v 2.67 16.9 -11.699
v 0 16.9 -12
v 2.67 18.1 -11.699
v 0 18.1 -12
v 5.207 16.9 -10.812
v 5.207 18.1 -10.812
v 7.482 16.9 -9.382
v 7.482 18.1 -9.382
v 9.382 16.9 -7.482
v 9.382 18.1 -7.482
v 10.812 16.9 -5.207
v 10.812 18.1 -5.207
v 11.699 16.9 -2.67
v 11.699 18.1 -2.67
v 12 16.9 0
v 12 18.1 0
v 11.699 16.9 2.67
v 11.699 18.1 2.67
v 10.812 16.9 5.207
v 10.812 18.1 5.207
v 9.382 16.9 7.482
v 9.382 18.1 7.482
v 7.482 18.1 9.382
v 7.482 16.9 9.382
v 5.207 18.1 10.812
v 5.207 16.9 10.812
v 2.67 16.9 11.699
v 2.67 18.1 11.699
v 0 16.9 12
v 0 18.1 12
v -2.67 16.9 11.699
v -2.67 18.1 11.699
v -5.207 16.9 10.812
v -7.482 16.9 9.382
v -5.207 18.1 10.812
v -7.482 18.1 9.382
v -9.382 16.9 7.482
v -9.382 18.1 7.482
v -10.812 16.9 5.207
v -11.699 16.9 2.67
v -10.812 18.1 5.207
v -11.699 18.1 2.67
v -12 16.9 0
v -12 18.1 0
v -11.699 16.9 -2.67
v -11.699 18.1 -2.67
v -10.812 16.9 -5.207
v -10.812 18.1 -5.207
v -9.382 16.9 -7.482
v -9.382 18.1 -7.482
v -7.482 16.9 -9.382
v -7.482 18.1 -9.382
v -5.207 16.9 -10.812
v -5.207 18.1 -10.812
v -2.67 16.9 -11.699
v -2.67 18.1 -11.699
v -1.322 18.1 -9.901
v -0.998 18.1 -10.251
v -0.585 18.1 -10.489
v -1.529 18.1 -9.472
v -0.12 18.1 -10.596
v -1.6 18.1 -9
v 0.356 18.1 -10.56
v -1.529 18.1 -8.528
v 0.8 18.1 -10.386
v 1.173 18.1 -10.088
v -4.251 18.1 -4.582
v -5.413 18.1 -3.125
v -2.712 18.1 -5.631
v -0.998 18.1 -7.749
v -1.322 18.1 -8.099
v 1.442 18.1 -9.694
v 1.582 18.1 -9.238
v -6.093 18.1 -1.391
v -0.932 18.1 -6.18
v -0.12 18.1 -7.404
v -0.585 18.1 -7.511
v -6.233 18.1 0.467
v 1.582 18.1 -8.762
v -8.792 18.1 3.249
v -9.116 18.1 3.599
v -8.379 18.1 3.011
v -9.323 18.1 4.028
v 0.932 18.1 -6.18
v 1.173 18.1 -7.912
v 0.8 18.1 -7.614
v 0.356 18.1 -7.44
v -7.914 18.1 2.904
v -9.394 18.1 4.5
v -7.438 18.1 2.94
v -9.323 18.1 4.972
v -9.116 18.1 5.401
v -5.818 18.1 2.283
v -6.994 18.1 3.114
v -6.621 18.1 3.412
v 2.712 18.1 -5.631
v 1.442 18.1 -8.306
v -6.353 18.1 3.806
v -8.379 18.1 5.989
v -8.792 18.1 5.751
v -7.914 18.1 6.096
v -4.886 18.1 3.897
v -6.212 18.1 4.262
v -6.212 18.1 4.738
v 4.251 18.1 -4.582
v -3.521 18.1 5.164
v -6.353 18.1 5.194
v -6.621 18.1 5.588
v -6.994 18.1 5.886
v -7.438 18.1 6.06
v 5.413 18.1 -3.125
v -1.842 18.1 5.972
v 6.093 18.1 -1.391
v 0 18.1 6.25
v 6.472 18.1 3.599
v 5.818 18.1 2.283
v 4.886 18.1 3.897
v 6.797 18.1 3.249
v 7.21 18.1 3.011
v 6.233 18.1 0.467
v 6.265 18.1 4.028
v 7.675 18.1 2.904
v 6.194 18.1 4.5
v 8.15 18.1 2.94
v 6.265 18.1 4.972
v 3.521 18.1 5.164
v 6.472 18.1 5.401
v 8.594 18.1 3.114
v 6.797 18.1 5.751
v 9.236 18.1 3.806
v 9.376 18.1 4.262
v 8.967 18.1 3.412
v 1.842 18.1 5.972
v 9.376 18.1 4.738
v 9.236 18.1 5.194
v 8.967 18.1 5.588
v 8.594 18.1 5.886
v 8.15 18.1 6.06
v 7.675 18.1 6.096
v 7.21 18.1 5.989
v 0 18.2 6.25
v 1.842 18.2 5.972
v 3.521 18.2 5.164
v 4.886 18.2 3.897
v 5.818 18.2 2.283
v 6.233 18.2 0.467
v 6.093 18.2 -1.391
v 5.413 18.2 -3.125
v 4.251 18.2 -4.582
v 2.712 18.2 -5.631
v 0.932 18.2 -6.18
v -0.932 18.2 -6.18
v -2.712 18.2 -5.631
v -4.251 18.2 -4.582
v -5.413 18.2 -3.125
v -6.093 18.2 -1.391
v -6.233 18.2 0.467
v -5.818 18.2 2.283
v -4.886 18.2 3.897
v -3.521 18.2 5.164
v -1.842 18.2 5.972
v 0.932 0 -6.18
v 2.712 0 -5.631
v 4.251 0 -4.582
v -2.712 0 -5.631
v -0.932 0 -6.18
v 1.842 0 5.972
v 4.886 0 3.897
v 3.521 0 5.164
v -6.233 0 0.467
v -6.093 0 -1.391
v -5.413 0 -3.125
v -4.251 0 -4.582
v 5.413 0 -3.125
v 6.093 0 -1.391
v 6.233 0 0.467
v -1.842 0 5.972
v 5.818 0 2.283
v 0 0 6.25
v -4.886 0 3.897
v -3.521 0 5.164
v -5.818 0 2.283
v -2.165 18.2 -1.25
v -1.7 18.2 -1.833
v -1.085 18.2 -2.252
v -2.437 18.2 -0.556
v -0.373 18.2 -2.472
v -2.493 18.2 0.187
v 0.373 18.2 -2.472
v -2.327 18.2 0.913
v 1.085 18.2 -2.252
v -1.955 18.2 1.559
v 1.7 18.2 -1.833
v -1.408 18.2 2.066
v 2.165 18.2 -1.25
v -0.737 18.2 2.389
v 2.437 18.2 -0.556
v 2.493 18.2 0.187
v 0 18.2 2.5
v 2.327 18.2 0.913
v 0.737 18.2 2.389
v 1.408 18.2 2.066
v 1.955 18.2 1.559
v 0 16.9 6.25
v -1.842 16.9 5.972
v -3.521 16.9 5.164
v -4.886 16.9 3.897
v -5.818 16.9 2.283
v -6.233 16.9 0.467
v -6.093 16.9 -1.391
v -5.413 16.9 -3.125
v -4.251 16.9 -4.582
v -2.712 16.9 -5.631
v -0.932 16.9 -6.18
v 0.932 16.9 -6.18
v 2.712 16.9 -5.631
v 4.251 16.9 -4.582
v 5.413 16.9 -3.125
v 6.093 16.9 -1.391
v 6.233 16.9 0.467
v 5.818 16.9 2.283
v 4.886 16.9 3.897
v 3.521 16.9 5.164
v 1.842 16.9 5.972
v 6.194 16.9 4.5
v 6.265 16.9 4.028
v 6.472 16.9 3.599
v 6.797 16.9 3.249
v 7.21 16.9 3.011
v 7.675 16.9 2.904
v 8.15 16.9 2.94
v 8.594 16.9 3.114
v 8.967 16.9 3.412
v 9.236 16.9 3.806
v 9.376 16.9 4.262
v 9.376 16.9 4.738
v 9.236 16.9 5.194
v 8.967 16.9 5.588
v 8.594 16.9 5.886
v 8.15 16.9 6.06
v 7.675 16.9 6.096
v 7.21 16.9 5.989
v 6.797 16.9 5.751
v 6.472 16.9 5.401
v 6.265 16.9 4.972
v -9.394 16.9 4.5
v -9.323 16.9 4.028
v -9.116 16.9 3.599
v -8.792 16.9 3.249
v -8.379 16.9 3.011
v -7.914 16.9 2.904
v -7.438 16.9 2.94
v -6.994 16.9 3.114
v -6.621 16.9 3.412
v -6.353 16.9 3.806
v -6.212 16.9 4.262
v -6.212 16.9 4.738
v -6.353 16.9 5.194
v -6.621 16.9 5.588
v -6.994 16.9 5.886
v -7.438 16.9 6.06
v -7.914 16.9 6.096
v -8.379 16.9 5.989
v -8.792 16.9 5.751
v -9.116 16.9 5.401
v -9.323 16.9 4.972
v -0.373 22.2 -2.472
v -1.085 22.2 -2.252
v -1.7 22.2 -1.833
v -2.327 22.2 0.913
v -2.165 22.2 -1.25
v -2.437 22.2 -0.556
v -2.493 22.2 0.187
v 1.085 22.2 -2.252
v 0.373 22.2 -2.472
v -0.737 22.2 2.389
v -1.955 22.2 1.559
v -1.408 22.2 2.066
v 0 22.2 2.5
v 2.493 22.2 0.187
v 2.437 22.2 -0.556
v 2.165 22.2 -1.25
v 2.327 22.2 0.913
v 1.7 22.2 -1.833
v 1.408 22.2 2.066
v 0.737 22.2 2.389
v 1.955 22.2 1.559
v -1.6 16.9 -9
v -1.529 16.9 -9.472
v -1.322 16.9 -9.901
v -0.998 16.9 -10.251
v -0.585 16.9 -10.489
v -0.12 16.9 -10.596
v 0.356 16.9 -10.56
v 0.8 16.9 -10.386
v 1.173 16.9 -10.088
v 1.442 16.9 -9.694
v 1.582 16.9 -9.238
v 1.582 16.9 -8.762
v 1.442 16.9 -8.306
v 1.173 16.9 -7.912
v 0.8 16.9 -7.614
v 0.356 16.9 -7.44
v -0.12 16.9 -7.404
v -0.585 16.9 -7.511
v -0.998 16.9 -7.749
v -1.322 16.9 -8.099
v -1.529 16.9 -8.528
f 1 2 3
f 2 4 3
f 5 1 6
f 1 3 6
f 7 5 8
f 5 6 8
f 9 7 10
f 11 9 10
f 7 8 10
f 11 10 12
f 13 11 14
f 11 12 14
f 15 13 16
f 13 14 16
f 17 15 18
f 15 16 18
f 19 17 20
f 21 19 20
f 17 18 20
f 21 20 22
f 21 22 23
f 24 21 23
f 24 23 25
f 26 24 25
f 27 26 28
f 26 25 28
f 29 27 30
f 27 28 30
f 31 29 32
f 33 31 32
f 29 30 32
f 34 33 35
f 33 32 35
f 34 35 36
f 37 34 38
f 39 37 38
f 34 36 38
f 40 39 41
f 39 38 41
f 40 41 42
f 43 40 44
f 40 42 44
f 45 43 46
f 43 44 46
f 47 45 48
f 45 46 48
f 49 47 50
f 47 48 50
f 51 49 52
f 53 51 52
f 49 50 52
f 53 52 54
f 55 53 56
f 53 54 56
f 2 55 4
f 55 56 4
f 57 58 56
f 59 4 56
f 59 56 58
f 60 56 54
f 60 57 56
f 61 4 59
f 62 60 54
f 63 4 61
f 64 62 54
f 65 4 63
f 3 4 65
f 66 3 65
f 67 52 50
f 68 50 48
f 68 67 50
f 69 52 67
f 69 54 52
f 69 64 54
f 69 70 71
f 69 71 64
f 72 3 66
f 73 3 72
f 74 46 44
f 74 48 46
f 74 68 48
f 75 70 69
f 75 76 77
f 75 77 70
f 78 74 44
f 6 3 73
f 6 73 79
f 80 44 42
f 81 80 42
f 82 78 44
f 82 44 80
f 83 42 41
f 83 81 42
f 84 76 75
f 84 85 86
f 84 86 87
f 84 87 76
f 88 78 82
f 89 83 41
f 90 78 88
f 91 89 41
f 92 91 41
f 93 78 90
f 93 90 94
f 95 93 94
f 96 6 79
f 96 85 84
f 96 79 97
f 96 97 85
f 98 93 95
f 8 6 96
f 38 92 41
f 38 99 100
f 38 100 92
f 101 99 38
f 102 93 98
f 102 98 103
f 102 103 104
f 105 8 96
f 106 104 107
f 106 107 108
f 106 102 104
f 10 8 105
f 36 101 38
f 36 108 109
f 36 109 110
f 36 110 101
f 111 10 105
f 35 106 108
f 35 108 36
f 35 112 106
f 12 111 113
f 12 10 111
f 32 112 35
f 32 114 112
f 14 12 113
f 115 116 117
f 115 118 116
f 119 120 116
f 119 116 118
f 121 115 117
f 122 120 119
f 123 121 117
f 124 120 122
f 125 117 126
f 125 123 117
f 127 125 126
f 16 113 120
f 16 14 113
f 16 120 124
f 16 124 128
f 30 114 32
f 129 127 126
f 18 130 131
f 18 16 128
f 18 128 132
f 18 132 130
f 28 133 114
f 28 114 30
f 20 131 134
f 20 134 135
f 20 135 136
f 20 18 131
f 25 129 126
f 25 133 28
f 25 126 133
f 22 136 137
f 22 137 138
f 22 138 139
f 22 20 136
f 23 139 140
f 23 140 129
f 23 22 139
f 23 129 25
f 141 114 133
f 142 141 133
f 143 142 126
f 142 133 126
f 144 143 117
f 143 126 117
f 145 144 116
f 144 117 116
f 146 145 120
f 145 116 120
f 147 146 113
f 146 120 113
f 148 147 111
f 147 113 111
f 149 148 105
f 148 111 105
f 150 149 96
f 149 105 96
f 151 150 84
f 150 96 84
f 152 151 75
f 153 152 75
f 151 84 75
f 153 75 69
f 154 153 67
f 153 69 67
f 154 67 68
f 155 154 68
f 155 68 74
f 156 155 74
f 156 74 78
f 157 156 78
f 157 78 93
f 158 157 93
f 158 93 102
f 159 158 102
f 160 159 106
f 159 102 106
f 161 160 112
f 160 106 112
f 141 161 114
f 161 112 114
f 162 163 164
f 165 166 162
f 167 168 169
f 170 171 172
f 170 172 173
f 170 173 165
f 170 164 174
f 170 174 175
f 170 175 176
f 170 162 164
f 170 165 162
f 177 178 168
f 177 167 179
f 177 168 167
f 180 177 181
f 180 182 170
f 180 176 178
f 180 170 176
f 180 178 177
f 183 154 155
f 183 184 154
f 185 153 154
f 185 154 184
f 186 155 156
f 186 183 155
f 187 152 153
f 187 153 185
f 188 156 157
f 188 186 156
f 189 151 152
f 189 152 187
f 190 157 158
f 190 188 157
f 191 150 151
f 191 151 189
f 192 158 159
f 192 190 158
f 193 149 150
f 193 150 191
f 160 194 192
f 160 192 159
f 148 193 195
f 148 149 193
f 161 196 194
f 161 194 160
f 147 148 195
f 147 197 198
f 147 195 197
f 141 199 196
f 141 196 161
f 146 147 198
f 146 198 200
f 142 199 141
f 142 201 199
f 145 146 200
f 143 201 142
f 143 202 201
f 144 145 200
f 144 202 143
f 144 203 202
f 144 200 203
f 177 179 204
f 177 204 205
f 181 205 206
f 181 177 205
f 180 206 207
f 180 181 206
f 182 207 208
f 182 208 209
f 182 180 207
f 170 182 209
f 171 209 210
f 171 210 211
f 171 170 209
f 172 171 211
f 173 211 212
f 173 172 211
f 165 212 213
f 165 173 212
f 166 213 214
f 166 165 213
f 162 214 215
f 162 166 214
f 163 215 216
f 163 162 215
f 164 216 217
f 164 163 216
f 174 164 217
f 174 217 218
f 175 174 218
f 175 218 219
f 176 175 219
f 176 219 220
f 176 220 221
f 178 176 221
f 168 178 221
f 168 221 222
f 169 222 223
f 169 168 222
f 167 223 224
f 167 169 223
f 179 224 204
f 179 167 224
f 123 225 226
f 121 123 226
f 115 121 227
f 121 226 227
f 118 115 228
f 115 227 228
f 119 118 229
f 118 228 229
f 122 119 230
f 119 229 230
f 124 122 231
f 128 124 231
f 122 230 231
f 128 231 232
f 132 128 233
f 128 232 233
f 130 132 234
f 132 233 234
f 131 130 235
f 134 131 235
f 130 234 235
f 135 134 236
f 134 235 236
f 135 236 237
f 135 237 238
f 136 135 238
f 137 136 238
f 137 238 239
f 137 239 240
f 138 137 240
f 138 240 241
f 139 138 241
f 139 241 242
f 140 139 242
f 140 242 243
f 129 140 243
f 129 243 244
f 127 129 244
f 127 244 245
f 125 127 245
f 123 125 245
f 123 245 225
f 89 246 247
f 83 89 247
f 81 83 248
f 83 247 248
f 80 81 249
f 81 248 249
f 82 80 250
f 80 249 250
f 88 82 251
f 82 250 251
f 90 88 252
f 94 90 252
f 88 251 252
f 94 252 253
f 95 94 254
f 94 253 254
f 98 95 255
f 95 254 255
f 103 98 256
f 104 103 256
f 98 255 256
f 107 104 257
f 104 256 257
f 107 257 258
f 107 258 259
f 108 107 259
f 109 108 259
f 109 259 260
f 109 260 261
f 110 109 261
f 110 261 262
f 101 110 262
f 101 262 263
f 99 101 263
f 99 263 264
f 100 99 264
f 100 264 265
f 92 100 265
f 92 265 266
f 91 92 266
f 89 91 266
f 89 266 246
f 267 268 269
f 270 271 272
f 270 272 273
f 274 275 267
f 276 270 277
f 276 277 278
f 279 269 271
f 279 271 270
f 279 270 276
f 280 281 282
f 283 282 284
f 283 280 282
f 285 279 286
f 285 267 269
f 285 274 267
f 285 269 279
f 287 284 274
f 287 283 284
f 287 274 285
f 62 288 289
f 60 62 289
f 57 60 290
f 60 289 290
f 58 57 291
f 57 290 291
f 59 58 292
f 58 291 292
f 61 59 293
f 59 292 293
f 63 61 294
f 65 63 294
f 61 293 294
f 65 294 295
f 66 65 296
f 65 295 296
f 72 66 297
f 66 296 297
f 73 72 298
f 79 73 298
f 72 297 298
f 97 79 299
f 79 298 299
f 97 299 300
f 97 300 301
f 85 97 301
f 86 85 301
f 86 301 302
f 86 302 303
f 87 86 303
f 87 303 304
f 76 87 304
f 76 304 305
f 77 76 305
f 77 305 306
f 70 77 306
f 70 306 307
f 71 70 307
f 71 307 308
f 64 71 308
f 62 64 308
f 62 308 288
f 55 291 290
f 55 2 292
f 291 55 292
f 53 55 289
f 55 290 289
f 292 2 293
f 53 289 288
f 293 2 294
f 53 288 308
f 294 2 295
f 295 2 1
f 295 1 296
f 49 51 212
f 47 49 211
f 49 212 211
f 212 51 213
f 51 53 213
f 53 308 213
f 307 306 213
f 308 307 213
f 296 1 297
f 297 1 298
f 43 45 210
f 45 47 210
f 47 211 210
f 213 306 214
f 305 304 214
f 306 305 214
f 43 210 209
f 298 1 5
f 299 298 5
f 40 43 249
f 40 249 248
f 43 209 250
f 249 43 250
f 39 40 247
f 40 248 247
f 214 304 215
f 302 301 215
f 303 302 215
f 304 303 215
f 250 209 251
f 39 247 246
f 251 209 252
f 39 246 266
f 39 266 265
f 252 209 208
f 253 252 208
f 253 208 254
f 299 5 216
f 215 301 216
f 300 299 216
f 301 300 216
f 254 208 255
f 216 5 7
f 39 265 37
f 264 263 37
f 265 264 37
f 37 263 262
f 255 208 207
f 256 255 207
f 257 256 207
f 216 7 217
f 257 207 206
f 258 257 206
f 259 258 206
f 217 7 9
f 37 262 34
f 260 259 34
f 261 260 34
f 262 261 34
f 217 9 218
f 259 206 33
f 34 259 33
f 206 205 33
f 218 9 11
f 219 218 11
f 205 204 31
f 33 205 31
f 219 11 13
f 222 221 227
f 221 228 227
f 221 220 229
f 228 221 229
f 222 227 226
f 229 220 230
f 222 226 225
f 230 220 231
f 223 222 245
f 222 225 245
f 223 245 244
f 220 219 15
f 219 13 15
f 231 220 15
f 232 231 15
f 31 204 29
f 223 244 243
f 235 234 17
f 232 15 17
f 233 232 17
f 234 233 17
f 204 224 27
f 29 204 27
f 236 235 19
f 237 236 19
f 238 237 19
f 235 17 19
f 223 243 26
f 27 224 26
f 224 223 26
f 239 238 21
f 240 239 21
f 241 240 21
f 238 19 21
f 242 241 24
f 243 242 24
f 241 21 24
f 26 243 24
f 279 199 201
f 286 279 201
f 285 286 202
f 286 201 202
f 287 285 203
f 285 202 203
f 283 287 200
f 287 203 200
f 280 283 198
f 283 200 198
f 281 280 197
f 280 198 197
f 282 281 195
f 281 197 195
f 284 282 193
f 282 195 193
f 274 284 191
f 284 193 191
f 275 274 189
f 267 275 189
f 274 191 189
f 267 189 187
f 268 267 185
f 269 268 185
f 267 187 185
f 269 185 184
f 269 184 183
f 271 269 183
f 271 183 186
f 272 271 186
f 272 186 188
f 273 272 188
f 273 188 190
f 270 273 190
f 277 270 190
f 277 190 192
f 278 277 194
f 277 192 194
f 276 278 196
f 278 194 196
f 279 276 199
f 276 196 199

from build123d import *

# Parameters (mm, degrees)
SKETCH_1_W                  = 12
SKETCH_1_H                  = 1.2
SKETCH_2_R                  = 6.25
EXTRUDE_1_DEPTH             = 0.1
SKETCH_3_R                  = 2.5
EXTRUDE_2_DEPTH             = 4
EXTRUDE_START               = 16.9
SKETCH_5_R                  = 6.25
EXTRUDE_4_DEPTH             = 16.9
HOLE_WIZARD_3_2_3_2_1_D     = 3.2
HOLE_WIZARD_3_2_3_2_1_DEPTH = 18.1


with BuildPart() as part:
    # 草图1 → 旋转1 (revolve)
    with BuildSketch(Plane.XY, mode=Mode.PRIVATE) as revolve_1_sk:
        with Locations((6, 17.5)):
            Rectangle(SKETCH_1_W, SKETCH_1_H)
    revolve(revolve_1_sk.sketch.rotate(Axis((0, 18.1, 0), (0, -1, 0)), 270), axis=Axis((0, 18.1, 0), (0, -1, 0)))

    # 草图2 → 凸台-拉伸1 (add)
    with BuildSketch(Plane(origin=(0, 18.1, 0), x_dir=(-1, 0, 0), z_dir=(0, 1, 0))):
        with Locations(Location((0, 0, 0), (0, 0, 90))):
            Circle(SKETCH_2_R)
    extrude(amount=EXTRUDE_1_DEPTH)

    # 草图3 → 凸台-拉伸2 (add)
    with BuildSketch(Plane(origin=(0, 18.2, 0), x_dir=(-1, 0, 0), z_dir=(0, 1, 0))):
        with Locations(Location((0, 0, 0), (0, 0, 90))):
            Circle(SKETCH_3_R)
    extrude(amount=EXTRUDE_2_DEPTH)

    # 草图5 → 凸台-拉伸4 (add)
    with BuildSketch(Plane.XZ.offset(-16.9).offset(EXTRUDE_START)):
        with Locations(Location((0, 0, 0), (0, 0, 90))):
            Circle(SKETCH_5_R)
    extrude(amount=-EXTRUDE_4_DEPTH)

    # Ø3.2 (3.2) 直径孔1
    with Locations(Plane(origin=(0, 18.1, 0), x_dir=(1, 0, 0), z_dir=(0, 1, 0))):
        with Locations((-7.794228634, -4.5), (7.794228634, -4.5), (0, 9)):
            Hole(HOLE_WIZARD_3_2_3_2_1_D / 2, depth=HOLE_WIZARD_3_2_3_2_1_DEPTH)


solid = part.part
